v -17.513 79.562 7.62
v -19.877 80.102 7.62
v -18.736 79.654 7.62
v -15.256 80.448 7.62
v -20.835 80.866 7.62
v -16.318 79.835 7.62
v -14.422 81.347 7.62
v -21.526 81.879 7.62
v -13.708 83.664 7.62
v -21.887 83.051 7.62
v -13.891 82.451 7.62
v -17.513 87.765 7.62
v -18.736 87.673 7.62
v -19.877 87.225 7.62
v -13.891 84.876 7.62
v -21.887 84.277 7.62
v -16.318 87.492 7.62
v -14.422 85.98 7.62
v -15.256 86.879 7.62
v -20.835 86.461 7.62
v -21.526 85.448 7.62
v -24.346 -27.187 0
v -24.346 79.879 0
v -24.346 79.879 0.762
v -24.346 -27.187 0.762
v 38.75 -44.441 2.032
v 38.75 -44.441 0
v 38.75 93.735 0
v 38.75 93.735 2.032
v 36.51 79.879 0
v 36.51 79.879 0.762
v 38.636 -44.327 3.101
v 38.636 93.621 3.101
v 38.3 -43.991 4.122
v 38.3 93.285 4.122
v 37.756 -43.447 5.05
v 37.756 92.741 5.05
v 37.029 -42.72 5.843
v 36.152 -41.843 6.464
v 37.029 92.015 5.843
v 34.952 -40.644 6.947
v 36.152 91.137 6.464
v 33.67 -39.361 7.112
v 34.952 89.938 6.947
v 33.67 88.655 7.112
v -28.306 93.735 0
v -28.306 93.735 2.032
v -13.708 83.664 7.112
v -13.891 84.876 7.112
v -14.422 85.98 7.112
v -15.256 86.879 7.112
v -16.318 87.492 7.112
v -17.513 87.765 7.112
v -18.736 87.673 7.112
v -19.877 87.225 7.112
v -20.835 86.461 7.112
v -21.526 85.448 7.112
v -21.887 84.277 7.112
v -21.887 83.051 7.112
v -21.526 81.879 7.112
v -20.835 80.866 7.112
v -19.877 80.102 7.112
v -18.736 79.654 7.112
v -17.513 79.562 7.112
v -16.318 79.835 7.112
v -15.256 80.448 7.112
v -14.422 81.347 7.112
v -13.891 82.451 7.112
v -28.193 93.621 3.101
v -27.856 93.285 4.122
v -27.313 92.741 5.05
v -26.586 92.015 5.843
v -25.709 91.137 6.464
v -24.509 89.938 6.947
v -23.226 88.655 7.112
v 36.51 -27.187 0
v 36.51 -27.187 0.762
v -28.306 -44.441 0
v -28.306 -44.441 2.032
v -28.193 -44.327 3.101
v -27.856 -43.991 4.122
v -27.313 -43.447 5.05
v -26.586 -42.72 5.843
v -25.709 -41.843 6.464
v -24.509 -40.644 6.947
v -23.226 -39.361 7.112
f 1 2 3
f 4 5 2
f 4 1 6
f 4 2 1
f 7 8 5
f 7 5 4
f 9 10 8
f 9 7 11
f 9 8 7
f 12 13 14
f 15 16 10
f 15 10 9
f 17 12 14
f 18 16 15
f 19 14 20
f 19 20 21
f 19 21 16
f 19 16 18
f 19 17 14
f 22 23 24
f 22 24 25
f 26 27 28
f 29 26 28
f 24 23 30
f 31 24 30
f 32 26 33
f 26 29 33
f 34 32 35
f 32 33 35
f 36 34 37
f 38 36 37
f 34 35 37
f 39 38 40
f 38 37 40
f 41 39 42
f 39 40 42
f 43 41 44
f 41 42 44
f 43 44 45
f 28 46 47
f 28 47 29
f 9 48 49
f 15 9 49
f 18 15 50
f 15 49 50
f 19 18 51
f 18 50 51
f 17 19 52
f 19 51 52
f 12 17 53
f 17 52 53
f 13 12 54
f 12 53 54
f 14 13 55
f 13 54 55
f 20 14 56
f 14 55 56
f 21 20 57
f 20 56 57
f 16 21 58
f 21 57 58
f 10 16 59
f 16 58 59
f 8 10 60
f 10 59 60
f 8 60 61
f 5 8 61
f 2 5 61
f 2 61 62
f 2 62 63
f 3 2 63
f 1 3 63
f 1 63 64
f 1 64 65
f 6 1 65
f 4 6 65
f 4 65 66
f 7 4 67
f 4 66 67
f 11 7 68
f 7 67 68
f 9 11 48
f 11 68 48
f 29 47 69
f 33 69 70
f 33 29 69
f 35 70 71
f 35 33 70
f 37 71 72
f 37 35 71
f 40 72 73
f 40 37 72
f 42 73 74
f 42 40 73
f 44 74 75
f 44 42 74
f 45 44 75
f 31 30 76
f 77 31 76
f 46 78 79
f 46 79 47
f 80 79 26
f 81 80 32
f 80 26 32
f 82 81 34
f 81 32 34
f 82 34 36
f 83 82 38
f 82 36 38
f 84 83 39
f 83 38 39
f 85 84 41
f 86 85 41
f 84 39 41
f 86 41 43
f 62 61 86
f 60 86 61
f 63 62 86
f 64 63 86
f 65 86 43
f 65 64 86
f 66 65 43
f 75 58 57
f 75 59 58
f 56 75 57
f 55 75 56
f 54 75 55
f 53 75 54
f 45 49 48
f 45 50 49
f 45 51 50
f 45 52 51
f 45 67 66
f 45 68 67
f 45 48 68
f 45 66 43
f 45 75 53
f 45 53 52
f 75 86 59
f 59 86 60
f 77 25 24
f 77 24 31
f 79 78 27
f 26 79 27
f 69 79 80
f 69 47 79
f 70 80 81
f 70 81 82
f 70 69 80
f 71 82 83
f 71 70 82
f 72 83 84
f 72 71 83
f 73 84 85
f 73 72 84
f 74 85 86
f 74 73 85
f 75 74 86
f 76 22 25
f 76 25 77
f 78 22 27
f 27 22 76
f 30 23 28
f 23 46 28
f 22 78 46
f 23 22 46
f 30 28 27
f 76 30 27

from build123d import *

# Parameters (mm, degrees)
F0_W     = 67.056
F0_H     = 138.176
F1_DEPTH = 7.112
F2_R     = 5.08
F3_R     = 4.112792
F4_DEPTH = 0.508
F5_W     = 60.855792
F5_H     = 107.066445
F6_DEPTH = 0.762


with BuildPart() as f1:
    # F0 (on Top) → F1 (new body)
    with BuildSketch(Plane.XY):
        with Locations((5.221646, 24.647108)):
            Rectangle(F0_W, F0_H)
    extrude(amount=F1_DEPTH)

    # F2
    f2_edges = [f1.edges().sort_by_distance(p)[0] for p in [
        (38.749646, 24.647108, 7.112),
        (5.221646, -44.440892, 7.112),
        (-28.306354, 24.647108, 7.112),
        (5.221646, 93.735108, 7.112),
    ]]
    fillet(f2_edges, radius=F2_R)

    # F3 (on face) → F4 (join)
    with BuildSketch(Plane.XY.offset(7.112)):
        with Locations((-17.820586, 83.663628)):
            Circle(F3_R)
    extrude(amount=F4_DEPTH)

    # F5 (on face) → F6 (cut)
    with BuildSketch(Plane(origin=(0, 0, 0), x_dir=(1, 0, 0), z_dir=(0, 0, -1))):
        with Locations((6.081841, -26.345763)):
            Rectangle(F5_W, F5_H)
    extrude(amount=-F6_DEPTH, mode=Mode.SUBTRACT)


solid = f1.part
